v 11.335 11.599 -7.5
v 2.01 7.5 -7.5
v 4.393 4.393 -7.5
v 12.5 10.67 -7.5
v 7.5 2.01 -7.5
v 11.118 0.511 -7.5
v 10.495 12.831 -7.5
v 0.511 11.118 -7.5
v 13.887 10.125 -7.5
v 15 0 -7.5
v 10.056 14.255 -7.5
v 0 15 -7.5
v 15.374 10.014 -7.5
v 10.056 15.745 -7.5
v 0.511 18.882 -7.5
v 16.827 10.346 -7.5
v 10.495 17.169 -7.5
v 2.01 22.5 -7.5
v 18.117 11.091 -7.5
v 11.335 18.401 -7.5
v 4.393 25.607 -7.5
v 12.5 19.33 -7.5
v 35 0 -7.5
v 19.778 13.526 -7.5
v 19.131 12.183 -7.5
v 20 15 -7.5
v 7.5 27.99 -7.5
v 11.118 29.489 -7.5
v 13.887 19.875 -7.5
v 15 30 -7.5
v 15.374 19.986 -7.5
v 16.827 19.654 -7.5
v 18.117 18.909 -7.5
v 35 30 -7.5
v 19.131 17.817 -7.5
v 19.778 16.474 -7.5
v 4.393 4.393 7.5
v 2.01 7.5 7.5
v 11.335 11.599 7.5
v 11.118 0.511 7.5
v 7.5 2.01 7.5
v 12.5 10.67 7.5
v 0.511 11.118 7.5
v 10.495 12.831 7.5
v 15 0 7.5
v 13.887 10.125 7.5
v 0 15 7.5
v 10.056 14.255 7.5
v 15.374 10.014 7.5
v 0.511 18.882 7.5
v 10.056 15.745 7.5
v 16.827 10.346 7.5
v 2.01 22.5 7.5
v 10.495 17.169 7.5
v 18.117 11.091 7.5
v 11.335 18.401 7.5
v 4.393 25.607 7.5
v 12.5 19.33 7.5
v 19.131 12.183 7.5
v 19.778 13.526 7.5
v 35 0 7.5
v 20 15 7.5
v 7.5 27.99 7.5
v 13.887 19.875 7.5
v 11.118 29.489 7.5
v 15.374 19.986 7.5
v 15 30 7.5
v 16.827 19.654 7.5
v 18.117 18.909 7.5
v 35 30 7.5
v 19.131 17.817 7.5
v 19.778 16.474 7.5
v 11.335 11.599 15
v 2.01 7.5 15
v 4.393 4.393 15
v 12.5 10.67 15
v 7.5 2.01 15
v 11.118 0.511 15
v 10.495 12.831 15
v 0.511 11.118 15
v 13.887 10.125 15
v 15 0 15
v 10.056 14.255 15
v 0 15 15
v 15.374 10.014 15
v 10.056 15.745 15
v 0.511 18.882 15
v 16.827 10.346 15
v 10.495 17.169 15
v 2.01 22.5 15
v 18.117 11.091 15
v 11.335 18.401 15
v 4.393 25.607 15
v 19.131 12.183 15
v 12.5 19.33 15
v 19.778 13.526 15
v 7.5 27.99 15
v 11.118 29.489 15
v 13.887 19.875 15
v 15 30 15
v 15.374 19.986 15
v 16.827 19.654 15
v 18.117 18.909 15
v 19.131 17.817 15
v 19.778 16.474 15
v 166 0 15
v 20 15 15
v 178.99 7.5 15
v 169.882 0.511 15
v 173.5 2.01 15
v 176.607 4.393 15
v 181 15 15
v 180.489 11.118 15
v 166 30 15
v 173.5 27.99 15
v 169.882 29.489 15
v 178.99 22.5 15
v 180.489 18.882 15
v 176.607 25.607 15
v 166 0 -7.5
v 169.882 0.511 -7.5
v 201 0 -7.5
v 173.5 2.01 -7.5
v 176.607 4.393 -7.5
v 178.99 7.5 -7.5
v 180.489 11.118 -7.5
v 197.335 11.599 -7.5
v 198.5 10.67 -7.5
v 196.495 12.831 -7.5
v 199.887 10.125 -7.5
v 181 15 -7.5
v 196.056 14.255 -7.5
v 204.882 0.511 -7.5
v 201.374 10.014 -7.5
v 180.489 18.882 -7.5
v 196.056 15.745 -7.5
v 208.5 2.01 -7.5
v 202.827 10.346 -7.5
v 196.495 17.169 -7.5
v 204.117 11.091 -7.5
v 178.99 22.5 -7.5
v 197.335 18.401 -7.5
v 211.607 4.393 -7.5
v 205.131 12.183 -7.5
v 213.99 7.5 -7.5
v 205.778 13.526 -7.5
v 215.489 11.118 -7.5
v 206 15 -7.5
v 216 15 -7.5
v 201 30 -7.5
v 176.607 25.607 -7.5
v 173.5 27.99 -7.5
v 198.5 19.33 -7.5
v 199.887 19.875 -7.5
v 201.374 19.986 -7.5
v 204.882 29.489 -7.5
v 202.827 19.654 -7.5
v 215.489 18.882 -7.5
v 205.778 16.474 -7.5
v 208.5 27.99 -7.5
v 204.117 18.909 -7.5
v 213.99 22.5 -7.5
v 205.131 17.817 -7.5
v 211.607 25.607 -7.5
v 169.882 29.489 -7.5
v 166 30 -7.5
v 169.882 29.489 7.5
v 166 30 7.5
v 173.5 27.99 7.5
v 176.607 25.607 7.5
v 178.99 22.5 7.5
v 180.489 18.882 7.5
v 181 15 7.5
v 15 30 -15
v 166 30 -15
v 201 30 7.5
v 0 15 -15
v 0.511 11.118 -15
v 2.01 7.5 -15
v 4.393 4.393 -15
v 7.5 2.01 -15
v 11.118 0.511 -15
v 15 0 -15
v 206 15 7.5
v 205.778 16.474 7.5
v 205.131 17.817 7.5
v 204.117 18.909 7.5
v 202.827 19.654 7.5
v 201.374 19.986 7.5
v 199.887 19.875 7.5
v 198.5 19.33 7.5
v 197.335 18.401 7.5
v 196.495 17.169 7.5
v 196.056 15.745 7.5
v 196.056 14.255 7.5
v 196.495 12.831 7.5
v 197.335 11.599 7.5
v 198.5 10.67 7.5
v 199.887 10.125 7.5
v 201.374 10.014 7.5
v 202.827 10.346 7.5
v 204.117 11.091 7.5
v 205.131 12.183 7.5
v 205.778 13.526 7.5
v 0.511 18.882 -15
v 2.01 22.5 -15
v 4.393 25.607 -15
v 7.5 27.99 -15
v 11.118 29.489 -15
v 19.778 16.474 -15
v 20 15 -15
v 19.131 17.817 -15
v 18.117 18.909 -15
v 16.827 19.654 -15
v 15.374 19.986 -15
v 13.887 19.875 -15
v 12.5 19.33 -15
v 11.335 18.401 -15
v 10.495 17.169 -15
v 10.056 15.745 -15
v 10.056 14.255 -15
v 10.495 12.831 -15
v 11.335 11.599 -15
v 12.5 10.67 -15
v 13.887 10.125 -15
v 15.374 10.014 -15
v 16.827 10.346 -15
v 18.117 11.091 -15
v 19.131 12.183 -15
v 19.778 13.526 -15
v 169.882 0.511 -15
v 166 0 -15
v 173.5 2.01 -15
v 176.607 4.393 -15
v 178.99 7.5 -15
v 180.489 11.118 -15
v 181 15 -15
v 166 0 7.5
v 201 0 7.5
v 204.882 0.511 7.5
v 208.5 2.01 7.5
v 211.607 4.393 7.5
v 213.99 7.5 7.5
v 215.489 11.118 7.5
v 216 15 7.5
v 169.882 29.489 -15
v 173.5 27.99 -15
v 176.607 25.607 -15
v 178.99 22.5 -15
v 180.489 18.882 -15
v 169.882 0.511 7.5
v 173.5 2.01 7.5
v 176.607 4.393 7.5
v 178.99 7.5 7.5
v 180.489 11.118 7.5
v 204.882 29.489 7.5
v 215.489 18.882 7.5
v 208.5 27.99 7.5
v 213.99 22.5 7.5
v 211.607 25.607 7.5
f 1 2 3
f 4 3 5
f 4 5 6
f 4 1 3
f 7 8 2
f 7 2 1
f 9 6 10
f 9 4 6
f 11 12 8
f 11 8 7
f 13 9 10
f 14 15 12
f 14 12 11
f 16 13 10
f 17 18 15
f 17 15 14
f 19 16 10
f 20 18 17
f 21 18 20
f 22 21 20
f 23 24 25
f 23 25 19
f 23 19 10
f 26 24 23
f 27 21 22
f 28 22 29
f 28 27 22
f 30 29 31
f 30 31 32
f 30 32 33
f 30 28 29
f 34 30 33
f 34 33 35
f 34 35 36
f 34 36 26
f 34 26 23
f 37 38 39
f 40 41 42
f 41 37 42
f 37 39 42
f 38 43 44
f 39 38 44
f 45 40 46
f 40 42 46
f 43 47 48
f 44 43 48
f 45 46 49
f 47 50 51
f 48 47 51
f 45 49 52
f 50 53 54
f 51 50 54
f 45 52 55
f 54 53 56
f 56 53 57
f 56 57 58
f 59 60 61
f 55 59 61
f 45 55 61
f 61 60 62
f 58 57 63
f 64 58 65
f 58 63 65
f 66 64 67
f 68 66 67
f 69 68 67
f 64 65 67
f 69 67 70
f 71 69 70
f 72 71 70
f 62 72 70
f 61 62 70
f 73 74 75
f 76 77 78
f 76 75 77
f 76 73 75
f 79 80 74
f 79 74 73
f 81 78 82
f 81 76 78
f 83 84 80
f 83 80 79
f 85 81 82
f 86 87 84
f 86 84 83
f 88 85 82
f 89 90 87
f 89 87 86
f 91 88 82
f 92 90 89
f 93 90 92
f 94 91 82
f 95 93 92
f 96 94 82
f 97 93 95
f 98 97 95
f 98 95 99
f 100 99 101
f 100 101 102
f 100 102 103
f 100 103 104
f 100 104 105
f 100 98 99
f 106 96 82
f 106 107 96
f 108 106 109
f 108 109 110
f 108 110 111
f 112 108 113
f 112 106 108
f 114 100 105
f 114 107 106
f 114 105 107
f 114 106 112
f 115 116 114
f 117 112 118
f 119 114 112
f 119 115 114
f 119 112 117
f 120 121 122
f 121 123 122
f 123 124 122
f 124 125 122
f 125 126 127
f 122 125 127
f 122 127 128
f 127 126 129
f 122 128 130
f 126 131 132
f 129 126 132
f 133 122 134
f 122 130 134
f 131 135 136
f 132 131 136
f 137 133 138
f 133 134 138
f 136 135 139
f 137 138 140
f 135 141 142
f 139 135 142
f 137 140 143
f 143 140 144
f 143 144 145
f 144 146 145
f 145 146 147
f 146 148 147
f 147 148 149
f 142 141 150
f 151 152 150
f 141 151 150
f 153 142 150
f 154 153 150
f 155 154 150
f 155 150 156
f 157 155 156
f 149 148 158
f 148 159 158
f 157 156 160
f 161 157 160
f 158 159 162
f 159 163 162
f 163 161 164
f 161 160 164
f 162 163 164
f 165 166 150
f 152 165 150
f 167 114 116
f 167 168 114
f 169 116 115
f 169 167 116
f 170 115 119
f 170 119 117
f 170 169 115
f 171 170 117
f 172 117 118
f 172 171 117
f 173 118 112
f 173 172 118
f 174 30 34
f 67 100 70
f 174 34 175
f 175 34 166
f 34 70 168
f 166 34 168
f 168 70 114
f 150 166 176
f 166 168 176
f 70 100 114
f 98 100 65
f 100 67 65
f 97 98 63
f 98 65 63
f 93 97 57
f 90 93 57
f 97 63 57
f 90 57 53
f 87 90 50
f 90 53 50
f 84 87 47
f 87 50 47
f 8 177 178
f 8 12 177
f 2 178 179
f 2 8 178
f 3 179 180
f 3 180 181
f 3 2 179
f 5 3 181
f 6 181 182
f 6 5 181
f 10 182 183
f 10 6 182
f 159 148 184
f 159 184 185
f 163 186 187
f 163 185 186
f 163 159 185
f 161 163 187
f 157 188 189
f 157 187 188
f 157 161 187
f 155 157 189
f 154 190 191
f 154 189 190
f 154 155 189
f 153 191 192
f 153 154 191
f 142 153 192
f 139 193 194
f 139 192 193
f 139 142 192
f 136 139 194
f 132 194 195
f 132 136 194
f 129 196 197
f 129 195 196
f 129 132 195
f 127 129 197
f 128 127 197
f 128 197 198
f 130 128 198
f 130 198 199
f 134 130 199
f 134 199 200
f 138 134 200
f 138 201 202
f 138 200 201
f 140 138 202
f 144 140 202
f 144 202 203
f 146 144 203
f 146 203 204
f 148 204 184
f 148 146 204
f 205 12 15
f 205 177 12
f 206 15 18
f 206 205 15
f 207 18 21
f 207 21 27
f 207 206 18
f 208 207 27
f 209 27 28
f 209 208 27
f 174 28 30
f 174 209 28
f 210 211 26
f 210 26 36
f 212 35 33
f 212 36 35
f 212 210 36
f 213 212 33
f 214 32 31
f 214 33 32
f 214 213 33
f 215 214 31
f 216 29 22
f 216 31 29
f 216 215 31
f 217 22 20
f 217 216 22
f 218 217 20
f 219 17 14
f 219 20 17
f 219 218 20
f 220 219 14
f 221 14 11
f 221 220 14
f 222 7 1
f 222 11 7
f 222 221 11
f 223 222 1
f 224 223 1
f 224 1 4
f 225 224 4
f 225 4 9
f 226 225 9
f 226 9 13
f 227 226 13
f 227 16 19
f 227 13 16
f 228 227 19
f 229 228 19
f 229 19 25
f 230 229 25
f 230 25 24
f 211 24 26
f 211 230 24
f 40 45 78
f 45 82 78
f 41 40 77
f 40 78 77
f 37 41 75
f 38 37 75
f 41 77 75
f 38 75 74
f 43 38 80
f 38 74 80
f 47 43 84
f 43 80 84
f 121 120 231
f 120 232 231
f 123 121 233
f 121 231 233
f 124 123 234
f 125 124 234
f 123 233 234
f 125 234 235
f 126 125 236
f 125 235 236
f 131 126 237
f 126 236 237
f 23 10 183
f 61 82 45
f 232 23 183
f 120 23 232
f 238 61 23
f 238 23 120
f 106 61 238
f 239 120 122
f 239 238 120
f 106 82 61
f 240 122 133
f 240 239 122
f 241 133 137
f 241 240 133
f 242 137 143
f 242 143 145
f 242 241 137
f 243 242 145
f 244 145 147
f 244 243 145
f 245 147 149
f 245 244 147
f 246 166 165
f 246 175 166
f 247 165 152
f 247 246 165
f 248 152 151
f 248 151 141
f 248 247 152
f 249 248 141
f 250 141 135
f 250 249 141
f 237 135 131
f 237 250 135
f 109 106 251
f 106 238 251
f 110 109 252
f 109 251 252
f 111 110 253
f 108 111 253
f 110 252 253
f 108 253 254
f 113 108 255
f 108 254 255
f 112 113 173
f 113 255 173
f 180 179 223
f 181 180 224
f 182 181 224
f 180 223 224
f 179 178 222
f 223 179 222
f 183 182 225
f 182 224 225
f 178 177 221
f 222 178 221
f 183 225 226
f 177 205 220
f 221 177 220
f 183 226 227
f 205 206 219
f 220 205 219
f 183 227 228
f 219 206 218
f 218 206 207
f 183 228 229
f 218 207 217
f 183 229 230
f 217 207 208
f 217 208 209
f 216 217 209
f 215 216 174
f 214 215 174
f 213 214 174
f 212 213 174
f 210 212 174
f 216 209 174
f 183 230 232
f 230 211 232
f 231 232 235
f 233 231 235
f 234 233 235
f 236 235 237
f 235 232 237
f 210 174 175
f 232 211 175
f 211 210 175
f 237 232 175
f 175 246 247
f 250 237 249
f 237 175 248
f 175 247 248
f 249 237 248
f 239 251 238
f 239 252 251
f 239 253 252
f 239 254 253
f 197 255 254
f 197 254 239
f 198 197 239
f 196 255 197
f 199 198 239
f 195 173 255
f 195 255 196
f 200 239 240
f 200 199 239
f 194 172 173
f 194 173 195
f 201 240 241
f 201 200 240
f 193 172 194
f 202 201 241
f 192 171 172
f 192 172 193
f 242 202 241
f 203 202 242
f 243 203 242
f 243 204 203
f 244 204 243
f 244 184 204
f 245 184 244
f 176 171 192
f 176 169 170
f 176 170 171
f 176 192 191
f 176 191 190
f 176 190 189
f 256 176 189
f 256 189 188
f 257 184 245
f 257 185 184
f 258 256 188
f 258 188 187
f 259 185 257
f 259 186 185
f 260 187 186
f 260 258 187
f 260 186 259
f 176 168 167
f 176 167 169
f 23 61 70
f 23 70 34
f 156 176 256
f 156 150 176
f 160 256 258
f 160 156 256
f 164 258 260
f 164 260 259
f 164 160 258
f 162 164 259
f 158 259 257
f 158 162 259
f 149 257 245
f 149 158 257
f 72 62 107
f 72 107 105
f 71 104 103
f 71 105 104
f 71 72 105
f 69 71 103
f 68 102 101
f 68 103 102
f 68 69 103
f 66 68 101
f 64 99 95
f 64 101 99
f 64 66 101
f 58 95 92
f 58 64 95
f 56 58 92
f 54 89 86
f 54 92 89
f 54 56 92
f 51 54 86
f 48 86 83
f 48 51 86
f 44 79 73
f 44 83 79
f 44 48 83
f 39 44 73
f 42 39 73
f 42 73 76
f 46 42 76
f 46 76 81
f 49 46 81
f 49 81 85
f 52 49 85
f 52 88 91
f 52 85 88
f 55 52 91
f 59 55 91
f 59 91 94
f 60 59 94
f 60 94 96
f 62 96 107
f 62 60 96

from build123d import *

# Parameters (mm, degrees)
SKETCH1_W               = 216
SKETCH1_H               = 30
BOSS_EXTRUDE1_DEPTH     = 15
CUT_EXTRUDE1_REACH      = 220.589
SKETCH2_W               = 35
SKETCH2_H               = 15
SKETCH2_H_2             = 7.5
FILLET1_R               = 15
CUT_EXTRUDE2_DEPTH      = 221.127235934
CUT_EXTRUDE2_DEPTH_BACK = 221.127235934
SKETCH3_R               = 5
FILLET3_R               = 15


with BuildPart() as part:
    # Sketch1 → Boss-Extrude1 (new, symmetric)
    with BuildSketch(Plane.XY):
        with Locations((108, 15)):
            Rectangle(SKETCH1_W, SKETCH1_H)
    extrude(amount=BOSS_EXTRUDE1_DEPTH, both=True)

    # Sketch2 → Cut-Extrude1 (cut, up to next)
    with BuildSketch(Plane(origin=(0, 30, 0), x_dir=(1, 0, 0), z_dir=(0, 1, 0)), mode=Mode.PRIVATE) as cut_extrude1_sk1:
        with Locations((17.5, 0)):
            Rectangle(SKETCH2_W, SKETCH2_H)
    cut_extrude1_tool1 = extrude(cut_extrude1_sk1.sketch, amount=-CUT_EXTRUDE1_REACH, mode=Mode.PRIVATE) & part.part
    # Sketch2 → Cut-Extrude1 (cut, up to next)
    with BuildSketch(Plane(origin=(0, 30, 0), x_dir=(1, 0, 0), z_dir=(0, 1, 0)), mode=Mode.PRIVATE) as cut_extrude1_sk2:
        with Locations((198.5, 11.25)):
            Rectangle(SKETCH2_W, SKETCH2_H_2)
    cut_extrude1_tool2 = extrude(cut_extrude1_sk2.sketch, amount=-CUT_EXTRUDE1_REACH, mode=Mode.PRIVATE) & part.part
    # Sketch2 → Cut-Extrude1 (cut, up to next)
    with BuildSketch(Plane(origin=(0, 30, 0), x_dir=(1, 0, 0), z_dir=(0, 1, 0)), mode=Mode.PRIVATE) as cut_extrude1_sk3:
        with Locations((198.5, -11.25)):
            Rectangle(SKETCH2_W, SKETCH2_H_2)
    cut_extrude1_tool3 = extrude(cut_extrude1_sk3.sketch, amount=-CUT_EXTRUDE1_REACH, mode=Mode.PRIVATE) & part.part
    add(cut_extrude1_tool1.solids().sort_by_distance((17.5, 30, 0))[0], mode=Mode.SUBTRACT)
    add(cut_extrude1_tool2.solids().sort_by_distance((198.5, 30, -11.25))[0], mode=Mode.SUBTRACT)
    add(cut_extrude1_tool3.solids().sort_by_distance((198.5, 30, 11.25))[0], mode=Mode.SUBTRACT)

    # Fillet1
    fillet1_edges = [part.edges().sort_by_distance(p)[0] for p in [
        (216, 0, 0),
        (216, 30, 0),
        (0, 0, 11.25),
        (0, 0, -11.25),
        (0, 30, -11.25),
        (0, 30, 11.25),
    ]]
    fillet(fillet1_edges, radius=FILLET1_R - 0.0001)  # a hair under: the kernel refuses the full size

    # Sketch3 → Cut-Extrude2 (cut, two sides: drawn at the far end of the back side and taken through both)
    with BuildSketch(Plane.XY.offset(15).offset(-CUT_EXTRUDE2_DEPTH_BACK)):
        with Locations((15, 15)):
            Circle(SKETCH3_R)
        with Locations((201, 15)):
            Circle(SKETCH3_R)
    extrude(amount=CUT_EXTRUDE2_DEPTH + CUT_EXTRUDE2_DEPTH_BACK, mode=Mode.SUBTRACT)

    # Fillet3
    fillet3_edges = [part.edges().sort_by_distance(p)[0] for p in [
        (181, 0, -11.25),
        (181, 30, -11.25),
        (181, 0, 11.25),
        (181, 30, 11.25),
    ]]
    fillet(fillet3_edges, radius=FILLET3_R - 0.0001)  # a hair under: the kernel refuses the full size


solid = part.part
